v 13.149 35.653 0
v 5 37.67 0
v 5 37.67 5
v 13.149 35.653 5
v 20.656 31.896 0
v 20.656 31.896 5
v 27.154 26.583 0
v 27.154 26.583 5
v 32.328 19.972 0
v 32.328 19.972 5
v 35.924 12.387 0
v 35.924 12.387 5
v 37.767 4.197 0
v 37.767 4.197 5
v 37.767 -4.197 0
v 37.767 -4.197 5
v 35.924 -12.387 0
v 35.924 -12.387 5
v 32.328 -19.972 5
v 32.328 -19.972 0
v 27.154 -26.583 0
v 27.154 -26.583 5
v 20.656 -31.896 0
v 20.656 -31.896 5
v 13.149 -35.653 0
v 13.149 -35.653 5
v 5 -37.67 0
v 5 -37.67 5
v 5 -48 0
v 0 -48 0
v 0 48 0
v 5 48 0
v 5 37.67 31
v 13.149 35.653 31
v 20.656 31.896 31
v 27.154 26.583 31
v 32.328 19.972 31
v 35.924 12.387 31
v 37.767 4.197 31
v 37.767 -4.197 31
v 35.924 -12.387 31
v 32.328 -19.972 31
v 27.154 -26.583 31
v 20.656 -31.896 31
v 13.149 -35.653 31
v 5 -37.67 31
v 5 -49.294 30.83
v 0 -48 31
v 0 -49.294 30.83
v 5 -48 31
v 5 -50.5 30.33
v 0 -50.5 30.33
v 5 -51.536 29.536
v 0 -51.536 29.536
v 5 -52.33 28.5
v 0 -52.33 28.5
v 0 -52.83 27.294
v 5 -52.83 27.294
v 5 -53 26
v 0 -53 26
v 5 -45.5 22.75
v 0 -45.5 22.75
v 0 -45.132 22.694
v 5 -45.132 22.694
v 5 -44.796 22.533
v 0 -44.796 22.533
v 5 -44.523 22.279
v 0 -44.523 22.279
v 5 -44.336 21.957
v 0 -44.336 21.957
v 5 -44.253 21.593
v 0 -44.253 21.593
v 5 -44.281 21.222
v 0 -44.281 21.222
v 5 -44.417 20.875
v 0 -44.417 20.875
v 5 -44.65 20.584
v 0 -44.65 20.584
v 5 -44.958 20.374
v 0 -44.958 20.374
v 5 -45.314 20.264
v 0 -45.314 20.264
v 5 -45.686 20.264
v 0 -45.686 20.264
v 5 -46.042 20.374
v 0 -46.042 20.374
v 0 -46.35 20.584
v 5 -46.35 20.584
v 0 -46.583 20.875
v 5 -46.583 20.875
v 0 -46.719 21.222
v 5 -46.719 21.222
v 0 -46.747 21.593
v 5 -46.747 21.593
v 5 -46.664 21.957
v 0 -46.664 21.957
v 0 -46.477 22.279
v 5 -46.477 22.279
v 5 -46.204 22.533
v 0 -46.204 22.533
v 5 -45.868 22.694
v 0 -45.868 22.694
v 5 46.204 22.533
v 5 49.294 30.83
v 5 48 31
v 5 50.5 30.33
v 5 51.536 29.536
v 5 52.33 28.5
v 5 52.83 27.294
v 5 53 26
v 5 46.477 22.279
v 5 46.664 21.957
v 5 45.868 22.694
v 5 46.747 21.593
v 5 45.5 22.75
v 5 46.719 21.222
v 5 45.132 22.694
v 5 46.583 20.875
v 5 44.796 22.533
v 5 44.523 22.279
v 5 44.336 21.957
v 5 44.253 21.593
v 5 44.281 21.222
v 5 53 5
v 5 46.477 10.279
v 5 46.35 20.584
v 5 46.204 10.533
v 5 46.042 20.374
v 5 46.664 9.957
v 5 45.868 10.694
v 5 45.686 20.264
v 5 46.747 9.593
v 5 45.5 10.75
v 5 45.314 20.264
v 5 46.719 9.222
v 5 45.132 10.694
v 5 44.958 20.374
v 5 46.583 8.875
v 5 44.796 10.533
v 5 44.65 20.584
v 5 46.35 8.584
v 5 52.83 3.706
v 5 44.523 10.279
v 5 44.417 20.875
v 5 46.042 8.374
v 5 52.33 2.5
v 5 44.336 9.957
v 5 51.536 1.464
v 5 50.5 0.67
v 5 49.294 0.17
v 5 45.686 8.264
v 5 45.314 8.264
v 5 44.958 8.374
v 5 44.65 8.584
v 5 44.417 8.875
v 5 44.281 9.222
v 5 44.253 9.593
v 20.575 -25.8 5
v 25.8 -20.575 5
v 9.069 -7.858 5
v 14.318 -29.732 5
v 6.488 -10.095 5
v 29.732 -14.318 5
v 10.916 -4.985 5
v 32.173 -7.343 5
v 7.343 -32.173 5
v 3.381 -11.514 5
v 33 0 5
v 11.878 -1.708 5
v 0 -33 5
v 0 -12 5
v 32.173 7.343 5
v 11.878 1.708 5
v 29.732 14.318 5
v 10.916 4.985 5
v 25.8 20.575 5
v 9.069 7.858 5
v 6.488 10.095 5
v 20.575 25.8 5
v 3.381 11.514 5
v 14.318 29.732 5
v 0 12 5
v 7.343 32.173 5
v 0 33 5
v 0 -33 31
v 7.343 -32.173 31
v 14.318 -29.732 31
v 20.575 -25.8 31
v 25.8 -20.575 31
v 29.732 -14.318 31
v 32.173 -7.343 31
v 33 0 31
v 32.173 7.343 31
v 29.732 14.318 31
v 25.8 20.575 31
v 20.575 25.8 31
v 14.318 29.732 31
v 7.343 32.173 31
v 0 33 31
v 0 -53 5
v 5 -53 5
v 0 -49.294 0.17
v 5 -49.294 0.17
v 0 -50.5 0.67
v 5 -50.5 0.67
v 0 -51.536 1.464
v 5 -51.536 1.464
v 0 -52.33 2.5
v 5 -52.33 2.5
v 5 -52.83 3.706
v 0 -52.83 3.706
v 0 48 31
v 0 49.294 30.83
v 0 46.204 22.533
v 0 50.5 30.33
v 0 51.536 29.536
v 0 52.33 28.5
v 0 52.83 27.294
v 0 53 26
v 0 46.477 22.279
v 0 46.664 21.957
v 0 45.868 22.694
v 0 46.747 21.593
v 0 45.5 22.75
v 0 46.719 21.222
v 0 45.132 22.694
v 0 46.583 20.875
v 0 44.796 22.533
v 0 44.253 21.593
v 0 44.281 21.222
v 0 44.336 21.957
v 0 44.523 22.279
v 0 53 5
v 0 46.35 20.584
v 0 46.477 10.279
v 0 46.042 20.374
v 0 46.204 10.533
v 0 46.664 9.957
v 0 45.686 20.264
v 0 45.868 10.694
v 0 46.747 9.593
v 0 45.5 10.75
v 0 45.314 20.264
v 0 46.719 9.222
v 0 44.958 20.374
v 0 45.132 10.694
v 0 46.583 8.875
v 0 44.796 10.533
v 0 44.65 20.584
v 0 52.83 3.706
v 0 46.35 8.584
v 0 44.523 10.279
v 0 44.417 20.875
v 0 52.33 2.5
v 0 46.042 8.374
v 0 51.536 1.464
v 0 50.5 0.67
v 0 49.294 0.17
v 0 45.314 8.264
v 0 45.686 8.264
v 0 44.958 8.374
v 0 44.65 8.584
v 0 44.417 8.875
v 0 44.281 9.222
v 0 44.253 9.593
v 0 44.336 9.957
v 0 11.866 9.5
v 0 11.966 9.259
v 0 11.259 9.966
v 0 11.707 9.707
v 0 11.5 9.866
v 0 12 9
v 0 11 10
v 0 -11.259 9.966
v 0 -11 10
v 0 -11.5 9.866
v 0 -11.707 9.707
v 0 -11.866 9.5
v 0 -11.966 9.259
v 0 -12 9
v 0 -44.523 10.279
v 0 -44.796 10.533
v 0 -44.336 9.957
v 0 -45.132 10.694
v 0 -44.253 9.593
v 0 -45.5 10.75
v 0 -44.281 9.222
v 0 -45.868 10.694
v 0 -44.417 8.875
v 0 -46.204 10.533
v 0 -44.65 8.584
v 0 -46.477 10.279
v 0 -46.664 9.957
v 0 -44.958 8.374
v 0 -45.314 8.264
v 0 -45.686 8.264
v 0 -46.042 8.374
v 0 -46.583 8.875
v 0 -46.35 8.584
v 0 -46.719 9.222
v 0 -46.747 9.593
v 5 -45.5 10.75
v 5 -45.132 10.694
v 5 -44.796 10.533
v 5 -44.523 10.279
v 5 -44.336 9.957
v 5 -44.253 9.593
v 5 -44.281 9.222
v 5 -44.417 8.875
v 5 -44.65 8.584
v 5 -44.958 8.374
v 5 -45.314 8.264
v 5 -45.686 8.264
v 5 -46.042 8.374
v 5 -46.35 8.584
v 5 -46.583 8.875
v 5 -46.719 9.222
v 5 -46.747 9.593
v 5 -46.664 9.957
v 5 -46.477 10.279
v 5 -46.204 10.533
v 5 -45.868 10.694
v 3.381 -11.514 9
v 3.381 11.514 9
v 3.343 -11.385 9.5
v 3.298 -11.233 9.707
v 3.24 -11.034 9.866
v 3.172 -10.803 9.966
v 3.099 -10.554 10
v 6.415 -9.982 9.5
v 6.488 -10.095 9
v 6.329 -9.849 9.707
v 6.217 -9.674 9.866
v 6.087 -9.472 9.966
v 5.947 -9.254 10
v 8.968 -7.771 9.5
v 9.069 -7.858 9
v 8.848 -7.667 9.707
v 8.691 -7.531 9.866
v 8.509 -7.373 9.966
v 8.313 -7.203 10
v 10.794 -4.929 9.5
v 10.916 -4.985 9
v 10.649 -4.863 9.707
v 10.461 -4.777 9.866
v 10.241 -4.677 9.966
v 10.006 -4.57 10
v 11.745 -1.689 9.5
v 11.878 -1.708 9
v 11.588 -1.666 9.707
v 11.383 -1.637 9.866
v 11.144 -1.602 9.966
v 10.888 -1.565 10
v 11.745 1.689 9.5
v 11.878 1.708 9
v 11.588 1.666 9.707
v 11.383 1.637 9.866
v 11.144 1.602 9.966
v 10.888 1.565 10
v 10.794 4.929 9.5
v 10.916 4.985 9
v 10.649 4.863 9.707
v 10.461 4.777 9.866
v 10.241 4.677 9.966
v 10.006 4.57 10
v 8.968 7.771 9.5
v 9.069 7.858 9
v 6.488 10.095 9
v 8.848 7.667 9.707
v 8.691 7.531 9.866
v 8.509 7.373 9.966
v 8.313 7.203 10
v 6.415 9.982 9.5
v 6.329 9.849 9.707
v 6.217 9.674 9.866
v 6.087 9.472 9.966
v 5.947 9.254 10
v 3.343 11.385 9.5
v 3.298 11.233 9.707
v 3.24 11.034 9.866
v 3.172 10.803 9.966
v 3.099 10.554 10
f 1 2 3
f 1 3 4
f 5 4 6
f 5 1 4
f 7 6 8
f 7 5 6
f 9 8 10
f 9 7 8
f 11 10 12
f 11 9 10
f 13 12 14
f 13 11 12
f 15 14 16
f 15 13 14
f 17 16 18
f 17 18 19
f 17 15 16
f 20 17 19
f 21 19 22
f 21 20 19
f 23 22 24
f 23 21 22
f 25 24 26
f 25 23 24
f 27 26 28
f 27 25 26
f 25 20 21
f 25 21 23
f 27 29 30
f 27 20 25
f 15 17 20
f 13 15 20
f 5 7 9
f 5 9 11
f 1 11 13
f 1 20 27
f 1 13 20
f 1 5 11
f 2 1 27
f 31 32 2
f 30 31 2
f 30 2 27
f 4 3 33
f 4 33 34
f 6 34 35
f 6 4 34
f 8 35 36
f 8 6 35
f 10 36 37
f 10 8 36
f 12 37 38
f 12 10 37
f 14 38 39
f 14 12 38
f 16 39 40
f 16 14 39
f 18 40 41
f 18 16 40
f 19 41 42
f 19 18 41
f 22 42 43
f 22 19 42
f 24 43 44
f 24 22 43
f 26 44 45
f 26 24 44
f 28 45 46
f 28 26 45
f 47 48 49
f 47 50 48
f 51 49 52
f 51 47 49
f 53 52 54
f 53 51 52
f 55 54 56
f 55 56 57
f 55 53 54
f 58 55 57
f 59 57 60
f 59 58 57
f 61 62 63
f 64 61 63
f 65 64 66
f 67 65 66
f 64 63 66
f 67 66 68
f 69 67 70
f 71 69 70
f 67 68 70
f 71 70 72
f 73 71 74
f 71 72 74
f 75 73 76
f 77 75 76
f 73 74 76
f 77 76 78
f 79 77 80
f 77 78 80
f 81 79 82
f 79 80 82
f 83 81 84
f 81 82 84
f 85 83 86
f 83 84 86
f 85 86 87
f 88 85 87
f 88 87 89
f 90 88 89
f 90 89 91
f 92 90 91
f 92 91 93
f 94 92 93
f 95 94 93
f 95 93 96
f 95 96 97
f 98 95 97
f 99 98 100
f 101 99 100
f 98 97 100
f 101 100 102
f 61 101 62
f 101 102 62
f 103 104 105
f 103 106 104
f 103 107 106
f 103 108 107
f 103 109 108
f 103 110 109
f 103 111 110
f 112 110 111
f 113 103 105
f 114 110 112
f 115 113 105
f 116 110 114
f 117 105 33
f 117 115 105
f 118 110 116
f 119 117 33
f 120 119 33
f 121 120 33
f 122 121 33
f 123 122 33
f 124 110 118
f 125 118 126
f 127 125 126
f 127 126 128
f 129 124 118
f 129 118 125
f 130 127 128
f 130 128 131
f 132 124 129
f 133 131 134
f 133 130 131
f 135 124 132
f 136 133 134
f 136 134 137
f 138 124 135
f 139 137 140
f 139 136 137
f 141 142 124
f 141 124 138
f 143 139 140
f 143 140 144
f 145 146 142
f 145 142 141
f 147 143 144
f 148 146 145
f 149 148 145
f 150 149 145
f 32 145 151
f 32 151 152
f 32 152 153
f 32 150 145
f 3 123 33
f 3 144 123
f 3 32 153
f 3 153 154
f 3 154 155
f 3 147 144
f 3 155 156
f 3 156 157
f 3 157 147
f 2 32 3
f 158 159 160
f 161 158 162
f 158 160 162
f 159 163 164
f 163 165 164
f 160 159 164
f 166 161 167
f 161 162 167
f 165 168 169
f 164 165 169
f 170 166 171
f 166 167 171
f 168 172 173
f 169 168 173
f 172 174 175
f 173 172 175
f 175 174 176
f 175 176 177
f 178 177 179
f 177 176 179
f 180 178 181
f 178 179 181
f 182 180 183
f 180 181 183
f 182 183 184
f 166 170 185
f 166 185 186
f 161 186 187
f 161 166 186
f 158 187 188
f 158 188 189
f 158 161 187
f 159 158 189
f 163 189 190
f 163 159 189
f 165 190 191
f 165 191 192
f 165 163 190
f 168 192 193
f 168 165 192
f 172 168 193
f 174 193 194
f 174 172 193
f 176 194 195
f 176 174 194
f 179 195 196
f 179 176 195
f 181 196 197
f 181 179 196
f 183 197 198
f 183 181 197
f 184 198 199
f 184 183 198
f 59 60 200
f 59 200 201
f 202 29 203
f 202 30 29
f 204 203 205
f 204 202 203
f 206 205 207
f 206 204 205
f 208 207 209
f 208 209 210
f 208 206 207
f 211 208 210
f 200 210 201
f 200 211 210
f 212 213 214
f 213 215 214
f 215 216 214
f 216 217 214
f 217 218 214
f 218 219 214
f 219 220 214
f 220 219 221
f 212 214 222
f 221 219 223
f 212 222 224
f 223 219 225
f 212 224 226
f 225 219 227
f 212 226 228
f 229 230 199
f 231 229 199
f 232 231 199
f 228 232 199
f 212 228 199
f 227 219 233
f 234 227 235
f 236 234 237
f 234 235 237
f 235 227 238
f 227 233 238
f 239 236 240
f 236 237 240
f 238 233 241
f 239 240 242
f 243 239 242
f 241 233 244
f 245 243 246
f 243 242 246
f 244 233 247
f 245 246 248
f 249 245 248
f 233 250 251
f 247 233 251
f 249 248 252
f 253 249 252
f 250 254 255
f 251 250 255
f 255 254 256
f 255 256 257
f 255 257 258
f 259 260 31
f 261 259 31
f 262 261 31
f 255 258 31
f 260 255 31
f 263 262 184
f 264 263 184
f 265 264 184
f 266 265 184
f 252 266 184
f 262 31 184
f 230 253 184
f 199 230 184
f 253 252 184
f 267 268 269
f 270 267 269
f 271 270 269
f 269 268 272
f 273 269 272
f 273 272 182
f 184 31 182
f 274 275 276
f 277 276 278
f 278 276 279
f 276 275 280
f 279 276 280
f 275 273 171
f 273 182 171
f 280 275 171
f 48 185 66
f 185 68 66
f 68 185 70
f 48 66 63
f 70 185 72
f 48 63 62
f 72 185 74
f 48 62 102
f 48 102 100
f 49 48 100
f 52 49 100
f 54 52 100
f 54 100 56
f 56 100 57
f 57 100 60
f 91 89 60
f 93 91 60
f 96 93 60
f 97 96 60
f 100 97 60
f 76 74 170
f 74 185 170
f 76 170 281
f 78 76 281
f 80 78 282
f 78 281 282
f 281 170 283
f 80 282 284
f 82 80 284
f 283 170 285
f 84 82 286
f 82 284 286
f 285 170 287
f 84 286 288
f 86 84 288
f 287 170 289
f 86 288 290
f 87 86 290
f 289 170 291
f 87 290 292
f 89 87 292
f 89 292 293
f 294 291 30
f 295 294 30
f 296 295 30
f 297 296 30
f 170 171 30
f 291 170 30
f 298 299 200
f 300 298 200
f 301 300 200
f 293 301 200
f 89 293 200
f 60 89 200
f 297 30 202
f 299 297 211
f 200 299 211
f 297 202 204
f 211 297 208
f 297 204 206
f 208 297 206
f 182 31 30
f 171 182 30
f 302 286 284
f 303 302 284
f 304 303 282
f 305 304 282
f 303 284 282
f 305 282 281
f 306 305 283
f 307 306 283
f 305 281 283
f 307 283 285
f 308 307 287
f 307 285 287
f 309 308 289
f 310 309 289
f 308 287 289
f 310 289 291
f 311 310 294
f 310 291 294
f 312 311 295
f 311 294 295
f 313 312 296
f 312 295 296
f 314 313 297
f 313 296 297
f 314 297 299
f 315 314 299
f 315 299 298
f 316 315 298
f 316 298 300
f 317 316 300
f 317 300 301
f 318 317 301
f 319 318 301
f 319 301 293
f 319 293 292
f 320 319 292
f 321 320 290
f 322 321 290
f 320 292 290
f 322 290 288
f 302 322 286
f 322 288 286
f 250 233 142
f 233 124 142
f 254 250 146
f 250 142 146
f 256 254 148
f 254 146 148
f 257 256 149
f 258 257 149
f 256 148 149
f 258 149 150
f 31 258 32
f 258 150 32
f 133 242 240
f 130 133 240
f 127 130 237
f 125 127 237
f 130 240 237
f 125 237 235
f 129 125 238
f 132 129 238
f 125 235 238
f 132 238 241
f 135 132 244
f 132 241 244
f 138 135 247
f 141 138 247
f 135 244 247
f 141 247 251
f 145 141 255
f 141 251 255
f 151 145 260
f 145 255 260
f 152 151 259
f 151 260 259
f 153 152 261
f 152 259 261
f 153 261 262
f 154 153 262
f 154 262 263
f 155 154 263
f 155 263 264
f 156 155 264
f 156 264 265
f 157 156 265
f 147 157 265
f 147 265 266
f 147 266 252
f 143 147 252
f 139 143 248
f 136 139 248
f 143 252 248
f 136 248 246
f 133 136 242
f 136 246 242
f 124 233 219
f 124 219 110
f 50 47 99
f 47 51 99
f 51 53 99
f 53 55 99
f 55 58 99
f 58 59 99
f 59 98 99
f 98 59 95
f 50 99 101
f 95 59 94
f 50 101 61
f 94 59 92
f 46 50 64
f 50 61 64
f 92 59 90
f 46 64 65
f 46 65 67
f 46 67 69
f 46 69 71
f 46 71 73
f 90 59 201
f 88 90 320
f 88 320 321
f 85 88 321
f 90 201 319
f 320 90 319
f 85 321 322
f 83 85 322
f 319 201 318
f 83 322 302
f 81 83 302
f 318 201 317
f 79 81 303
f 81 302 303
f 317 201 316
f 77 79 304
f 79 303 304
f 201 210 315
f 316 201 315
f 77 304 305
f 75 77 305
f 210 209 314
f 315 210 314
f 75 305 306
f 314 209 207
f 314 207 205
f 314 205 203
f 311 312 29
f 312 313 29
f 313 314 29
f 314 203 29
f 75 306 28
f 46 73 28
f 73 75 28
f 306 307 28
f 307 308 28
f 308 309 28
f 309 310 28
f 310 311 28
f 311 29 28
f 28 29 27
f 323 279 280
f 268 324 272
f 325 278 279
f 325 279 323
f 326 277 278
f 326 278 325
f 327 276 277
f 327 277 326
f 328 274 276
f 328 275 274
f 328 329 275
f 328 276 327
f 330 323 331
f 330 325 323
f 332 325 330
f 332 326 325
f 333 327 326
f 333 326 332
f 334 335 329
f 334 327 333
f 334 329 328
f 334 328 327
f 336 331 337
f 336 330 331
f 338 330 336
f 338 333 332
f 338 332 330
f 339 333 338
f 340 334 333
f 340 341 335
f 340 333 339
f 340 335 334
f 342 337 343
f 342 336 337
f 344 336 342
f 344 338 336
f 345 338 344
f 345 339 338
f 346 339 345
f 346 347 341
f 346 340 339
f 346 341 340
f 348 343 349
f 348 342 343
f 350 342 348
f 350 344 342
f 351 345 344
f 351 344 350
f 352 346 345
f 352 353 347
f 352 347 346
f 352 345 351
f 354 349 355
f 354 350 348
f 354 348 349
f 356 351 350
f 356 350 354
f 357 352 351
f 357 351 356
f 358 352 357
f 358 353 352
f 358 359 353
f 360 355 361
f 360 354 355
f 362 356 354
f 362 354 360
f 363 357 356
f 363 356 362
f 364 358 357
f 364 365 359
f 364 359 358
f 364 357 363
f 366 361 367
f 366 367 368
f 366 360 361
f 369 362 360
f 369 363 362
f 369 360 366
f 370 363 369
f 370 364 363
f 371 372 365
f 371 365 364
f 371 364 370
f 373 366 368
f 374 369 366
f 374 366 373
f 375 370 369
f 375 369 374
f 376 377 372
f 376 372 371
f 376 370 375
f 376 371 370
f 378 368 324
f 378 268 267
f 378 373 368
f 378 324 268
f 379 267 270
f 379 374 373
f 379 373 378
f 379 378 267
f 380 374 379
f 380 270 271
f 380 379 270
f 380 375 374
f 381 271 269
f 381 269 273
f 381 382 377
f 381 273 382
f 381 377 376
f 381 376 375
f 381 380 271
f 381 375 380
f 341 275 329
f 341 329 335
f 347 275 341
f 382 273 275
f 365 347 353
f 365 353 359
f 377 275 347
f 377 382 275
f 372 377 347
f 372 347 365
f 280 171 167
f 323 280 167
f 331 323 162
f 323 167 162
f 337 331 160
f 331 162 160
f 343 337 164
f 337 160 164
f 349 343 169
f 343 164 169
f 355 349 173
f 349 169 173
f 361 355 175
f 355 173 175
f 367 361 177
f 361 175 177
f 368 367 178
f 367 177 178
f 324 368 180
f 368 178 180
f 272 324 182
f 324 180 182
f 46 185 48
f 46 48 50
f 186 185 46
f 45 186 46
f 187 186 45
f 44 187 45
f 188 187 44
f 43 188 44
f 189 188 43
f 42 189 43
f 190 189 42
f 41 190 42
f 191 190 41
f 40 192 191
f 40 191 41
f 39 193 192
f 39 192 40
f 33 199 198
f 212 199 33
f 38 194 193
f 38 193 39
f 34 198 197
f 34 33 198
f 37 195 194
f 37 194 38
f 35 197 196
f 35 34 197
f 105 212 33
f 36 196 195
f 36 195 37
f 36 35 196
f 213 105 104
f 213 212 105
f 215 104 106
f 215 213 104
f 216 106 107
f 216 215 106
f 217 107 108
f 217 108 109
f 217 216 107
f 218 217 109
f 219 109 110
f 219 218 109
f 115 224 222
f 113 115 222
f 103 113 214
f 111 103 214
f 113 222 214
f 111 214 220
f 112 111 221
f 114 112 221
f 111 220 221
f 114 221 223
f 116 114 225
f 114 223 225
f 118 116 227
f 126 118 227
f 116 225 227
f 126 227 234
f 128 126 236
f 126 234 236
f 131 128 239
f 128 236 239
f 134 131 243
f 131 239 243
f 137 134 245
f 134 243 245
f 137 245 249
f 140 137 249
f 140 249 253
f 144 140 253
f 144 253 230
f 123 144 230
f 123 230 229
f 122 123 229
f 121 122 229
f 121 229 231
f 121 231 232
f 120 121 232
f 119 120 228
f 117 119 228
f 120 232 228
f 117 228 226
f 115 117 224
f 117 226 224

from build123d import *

# Parameters (mm, degrees)
SALIENTE_EXTRUIR1_DEPTH = 5
SALIENTE_EXTRUIR2_DEPTH = 26
SALIENTE_EXTRUIR3_DEPTH = 5
REDONDEO1_R             = 1
SALIENTE_EXTRUIR4_DEPTH = 26
REDONDEO2_R             = 5
CROQUIS5_R              = 1.25
CORTAR_EXTRUIR1_DEPTH   = 5


with BuildPart() as part:
    # Croquis1 → Saliente-Extruir1 (new body)
    with BuildSketch(Plane.XY):
        with BuildLine():
            Line((0, -38), (0, 38))
            Line((0, 38), (0, 53))
            Line((0, 53), (5, 53))
            Line((5, 53), (5, 37.669616404))
            ThreePointArc((5, 37.669616404), (38, 0), (5, -37.669616404))
            Line((5, -37.669616404), (5, -53))
            Line((5, -53), (0, -53))
            Line((0, -53), (0, -38))
        make_face()
    extrude(amount=SALIENTE_EXTRUIR1_DEPTH)

    # Croquis2 → Saliente-Extruir2 (add)
    with BuildSketch(Plane.XY.offset(5)):
        with BuildLine():
            Line((0, -38), (0, -33))
            ThreePointArc((0, -33), (33, 0), (0, 33))
            Line((0, 33), (0, 38))
            ThreePointArc((0, 38), (38, 0), (0, -38))
        make_face()
    extrude(amount=SALIENTE_EXTRUIR2_DEPTH)

    # Croquis3 → Saliente-Extruir3 (add)
    with BuildSketch(Plane.XY.offset(5)):
        with BuildLine():
            Line((0, 12), (0, -12))
            ThreePointArc((0, -12), (12, 0), (0, 12))
        make_face()
    extrude(amount=SALIENTE_EXTRUIR3_DEPTH)

    # Redondeo1
    redondeo1_edges = [part.edges().sort_by_distance(p)[0] for p in [
        (12, 0, 10),
    ]]
    fillet(redondeo1_edges, radius=REDONDEO1_R)

    # Croquis4 → Saliente-Extruir4 (add)
    with BuildSketch(Plane.XY.offset(5)):
        with BuildLine():
            Line((0, -38), (0, -53))
            Line((0, -53), (5, -53))
            Line((5, -53), (5, -37.669616404))
            ThreePointArc((5, -37.669616404), (2.505451722, -37.917314141), (0, -38))
        make_face()
        with BuildLine():
            Line((5, 37.669616404), (5, 53))
            Line((5, 53), (0, 53))
            Line((0, 53), (0, 38))
            ThreePointArc((0, 38), (2.505451722, 37.917314141), (5, 37.669616404))
        make_face()
    extrude(amount=SALIENTE_EXTRUIR4_DEPTH)

    # Redondeo2
    redondeo2_edges = [part.edges().sort_by_distance(p)[0] for p in [
        (2.5, 53, 0),
        (2.5, -53, 31),
        (2.5, 53, 31),
        (2.5, -53, 0),
    ]]
    fillet(redondeo2_edges, radius=REDONDEO2_R)

    # Croquis5 → Cortar-Extruir1 (cut)
    with BuildSketch(Plane.ZY):
        with Locations((9.5, 45.5)):
            Circle(CROQUIS5_R)
        with Locations((21.5, 45.5)):
            Circle(CROQUIS5_R)
        with Locations((21.5, -45.5)):
            Circle(CROQUIS5_R)
        with Locations((9.5, -45.5)):
            Circle(CROQUIS5_R)
    extrude(amount=-CORTAR_EXTRUIR1_DEPTH, mode=Mode.SUBTRACT)


solid = part.part
